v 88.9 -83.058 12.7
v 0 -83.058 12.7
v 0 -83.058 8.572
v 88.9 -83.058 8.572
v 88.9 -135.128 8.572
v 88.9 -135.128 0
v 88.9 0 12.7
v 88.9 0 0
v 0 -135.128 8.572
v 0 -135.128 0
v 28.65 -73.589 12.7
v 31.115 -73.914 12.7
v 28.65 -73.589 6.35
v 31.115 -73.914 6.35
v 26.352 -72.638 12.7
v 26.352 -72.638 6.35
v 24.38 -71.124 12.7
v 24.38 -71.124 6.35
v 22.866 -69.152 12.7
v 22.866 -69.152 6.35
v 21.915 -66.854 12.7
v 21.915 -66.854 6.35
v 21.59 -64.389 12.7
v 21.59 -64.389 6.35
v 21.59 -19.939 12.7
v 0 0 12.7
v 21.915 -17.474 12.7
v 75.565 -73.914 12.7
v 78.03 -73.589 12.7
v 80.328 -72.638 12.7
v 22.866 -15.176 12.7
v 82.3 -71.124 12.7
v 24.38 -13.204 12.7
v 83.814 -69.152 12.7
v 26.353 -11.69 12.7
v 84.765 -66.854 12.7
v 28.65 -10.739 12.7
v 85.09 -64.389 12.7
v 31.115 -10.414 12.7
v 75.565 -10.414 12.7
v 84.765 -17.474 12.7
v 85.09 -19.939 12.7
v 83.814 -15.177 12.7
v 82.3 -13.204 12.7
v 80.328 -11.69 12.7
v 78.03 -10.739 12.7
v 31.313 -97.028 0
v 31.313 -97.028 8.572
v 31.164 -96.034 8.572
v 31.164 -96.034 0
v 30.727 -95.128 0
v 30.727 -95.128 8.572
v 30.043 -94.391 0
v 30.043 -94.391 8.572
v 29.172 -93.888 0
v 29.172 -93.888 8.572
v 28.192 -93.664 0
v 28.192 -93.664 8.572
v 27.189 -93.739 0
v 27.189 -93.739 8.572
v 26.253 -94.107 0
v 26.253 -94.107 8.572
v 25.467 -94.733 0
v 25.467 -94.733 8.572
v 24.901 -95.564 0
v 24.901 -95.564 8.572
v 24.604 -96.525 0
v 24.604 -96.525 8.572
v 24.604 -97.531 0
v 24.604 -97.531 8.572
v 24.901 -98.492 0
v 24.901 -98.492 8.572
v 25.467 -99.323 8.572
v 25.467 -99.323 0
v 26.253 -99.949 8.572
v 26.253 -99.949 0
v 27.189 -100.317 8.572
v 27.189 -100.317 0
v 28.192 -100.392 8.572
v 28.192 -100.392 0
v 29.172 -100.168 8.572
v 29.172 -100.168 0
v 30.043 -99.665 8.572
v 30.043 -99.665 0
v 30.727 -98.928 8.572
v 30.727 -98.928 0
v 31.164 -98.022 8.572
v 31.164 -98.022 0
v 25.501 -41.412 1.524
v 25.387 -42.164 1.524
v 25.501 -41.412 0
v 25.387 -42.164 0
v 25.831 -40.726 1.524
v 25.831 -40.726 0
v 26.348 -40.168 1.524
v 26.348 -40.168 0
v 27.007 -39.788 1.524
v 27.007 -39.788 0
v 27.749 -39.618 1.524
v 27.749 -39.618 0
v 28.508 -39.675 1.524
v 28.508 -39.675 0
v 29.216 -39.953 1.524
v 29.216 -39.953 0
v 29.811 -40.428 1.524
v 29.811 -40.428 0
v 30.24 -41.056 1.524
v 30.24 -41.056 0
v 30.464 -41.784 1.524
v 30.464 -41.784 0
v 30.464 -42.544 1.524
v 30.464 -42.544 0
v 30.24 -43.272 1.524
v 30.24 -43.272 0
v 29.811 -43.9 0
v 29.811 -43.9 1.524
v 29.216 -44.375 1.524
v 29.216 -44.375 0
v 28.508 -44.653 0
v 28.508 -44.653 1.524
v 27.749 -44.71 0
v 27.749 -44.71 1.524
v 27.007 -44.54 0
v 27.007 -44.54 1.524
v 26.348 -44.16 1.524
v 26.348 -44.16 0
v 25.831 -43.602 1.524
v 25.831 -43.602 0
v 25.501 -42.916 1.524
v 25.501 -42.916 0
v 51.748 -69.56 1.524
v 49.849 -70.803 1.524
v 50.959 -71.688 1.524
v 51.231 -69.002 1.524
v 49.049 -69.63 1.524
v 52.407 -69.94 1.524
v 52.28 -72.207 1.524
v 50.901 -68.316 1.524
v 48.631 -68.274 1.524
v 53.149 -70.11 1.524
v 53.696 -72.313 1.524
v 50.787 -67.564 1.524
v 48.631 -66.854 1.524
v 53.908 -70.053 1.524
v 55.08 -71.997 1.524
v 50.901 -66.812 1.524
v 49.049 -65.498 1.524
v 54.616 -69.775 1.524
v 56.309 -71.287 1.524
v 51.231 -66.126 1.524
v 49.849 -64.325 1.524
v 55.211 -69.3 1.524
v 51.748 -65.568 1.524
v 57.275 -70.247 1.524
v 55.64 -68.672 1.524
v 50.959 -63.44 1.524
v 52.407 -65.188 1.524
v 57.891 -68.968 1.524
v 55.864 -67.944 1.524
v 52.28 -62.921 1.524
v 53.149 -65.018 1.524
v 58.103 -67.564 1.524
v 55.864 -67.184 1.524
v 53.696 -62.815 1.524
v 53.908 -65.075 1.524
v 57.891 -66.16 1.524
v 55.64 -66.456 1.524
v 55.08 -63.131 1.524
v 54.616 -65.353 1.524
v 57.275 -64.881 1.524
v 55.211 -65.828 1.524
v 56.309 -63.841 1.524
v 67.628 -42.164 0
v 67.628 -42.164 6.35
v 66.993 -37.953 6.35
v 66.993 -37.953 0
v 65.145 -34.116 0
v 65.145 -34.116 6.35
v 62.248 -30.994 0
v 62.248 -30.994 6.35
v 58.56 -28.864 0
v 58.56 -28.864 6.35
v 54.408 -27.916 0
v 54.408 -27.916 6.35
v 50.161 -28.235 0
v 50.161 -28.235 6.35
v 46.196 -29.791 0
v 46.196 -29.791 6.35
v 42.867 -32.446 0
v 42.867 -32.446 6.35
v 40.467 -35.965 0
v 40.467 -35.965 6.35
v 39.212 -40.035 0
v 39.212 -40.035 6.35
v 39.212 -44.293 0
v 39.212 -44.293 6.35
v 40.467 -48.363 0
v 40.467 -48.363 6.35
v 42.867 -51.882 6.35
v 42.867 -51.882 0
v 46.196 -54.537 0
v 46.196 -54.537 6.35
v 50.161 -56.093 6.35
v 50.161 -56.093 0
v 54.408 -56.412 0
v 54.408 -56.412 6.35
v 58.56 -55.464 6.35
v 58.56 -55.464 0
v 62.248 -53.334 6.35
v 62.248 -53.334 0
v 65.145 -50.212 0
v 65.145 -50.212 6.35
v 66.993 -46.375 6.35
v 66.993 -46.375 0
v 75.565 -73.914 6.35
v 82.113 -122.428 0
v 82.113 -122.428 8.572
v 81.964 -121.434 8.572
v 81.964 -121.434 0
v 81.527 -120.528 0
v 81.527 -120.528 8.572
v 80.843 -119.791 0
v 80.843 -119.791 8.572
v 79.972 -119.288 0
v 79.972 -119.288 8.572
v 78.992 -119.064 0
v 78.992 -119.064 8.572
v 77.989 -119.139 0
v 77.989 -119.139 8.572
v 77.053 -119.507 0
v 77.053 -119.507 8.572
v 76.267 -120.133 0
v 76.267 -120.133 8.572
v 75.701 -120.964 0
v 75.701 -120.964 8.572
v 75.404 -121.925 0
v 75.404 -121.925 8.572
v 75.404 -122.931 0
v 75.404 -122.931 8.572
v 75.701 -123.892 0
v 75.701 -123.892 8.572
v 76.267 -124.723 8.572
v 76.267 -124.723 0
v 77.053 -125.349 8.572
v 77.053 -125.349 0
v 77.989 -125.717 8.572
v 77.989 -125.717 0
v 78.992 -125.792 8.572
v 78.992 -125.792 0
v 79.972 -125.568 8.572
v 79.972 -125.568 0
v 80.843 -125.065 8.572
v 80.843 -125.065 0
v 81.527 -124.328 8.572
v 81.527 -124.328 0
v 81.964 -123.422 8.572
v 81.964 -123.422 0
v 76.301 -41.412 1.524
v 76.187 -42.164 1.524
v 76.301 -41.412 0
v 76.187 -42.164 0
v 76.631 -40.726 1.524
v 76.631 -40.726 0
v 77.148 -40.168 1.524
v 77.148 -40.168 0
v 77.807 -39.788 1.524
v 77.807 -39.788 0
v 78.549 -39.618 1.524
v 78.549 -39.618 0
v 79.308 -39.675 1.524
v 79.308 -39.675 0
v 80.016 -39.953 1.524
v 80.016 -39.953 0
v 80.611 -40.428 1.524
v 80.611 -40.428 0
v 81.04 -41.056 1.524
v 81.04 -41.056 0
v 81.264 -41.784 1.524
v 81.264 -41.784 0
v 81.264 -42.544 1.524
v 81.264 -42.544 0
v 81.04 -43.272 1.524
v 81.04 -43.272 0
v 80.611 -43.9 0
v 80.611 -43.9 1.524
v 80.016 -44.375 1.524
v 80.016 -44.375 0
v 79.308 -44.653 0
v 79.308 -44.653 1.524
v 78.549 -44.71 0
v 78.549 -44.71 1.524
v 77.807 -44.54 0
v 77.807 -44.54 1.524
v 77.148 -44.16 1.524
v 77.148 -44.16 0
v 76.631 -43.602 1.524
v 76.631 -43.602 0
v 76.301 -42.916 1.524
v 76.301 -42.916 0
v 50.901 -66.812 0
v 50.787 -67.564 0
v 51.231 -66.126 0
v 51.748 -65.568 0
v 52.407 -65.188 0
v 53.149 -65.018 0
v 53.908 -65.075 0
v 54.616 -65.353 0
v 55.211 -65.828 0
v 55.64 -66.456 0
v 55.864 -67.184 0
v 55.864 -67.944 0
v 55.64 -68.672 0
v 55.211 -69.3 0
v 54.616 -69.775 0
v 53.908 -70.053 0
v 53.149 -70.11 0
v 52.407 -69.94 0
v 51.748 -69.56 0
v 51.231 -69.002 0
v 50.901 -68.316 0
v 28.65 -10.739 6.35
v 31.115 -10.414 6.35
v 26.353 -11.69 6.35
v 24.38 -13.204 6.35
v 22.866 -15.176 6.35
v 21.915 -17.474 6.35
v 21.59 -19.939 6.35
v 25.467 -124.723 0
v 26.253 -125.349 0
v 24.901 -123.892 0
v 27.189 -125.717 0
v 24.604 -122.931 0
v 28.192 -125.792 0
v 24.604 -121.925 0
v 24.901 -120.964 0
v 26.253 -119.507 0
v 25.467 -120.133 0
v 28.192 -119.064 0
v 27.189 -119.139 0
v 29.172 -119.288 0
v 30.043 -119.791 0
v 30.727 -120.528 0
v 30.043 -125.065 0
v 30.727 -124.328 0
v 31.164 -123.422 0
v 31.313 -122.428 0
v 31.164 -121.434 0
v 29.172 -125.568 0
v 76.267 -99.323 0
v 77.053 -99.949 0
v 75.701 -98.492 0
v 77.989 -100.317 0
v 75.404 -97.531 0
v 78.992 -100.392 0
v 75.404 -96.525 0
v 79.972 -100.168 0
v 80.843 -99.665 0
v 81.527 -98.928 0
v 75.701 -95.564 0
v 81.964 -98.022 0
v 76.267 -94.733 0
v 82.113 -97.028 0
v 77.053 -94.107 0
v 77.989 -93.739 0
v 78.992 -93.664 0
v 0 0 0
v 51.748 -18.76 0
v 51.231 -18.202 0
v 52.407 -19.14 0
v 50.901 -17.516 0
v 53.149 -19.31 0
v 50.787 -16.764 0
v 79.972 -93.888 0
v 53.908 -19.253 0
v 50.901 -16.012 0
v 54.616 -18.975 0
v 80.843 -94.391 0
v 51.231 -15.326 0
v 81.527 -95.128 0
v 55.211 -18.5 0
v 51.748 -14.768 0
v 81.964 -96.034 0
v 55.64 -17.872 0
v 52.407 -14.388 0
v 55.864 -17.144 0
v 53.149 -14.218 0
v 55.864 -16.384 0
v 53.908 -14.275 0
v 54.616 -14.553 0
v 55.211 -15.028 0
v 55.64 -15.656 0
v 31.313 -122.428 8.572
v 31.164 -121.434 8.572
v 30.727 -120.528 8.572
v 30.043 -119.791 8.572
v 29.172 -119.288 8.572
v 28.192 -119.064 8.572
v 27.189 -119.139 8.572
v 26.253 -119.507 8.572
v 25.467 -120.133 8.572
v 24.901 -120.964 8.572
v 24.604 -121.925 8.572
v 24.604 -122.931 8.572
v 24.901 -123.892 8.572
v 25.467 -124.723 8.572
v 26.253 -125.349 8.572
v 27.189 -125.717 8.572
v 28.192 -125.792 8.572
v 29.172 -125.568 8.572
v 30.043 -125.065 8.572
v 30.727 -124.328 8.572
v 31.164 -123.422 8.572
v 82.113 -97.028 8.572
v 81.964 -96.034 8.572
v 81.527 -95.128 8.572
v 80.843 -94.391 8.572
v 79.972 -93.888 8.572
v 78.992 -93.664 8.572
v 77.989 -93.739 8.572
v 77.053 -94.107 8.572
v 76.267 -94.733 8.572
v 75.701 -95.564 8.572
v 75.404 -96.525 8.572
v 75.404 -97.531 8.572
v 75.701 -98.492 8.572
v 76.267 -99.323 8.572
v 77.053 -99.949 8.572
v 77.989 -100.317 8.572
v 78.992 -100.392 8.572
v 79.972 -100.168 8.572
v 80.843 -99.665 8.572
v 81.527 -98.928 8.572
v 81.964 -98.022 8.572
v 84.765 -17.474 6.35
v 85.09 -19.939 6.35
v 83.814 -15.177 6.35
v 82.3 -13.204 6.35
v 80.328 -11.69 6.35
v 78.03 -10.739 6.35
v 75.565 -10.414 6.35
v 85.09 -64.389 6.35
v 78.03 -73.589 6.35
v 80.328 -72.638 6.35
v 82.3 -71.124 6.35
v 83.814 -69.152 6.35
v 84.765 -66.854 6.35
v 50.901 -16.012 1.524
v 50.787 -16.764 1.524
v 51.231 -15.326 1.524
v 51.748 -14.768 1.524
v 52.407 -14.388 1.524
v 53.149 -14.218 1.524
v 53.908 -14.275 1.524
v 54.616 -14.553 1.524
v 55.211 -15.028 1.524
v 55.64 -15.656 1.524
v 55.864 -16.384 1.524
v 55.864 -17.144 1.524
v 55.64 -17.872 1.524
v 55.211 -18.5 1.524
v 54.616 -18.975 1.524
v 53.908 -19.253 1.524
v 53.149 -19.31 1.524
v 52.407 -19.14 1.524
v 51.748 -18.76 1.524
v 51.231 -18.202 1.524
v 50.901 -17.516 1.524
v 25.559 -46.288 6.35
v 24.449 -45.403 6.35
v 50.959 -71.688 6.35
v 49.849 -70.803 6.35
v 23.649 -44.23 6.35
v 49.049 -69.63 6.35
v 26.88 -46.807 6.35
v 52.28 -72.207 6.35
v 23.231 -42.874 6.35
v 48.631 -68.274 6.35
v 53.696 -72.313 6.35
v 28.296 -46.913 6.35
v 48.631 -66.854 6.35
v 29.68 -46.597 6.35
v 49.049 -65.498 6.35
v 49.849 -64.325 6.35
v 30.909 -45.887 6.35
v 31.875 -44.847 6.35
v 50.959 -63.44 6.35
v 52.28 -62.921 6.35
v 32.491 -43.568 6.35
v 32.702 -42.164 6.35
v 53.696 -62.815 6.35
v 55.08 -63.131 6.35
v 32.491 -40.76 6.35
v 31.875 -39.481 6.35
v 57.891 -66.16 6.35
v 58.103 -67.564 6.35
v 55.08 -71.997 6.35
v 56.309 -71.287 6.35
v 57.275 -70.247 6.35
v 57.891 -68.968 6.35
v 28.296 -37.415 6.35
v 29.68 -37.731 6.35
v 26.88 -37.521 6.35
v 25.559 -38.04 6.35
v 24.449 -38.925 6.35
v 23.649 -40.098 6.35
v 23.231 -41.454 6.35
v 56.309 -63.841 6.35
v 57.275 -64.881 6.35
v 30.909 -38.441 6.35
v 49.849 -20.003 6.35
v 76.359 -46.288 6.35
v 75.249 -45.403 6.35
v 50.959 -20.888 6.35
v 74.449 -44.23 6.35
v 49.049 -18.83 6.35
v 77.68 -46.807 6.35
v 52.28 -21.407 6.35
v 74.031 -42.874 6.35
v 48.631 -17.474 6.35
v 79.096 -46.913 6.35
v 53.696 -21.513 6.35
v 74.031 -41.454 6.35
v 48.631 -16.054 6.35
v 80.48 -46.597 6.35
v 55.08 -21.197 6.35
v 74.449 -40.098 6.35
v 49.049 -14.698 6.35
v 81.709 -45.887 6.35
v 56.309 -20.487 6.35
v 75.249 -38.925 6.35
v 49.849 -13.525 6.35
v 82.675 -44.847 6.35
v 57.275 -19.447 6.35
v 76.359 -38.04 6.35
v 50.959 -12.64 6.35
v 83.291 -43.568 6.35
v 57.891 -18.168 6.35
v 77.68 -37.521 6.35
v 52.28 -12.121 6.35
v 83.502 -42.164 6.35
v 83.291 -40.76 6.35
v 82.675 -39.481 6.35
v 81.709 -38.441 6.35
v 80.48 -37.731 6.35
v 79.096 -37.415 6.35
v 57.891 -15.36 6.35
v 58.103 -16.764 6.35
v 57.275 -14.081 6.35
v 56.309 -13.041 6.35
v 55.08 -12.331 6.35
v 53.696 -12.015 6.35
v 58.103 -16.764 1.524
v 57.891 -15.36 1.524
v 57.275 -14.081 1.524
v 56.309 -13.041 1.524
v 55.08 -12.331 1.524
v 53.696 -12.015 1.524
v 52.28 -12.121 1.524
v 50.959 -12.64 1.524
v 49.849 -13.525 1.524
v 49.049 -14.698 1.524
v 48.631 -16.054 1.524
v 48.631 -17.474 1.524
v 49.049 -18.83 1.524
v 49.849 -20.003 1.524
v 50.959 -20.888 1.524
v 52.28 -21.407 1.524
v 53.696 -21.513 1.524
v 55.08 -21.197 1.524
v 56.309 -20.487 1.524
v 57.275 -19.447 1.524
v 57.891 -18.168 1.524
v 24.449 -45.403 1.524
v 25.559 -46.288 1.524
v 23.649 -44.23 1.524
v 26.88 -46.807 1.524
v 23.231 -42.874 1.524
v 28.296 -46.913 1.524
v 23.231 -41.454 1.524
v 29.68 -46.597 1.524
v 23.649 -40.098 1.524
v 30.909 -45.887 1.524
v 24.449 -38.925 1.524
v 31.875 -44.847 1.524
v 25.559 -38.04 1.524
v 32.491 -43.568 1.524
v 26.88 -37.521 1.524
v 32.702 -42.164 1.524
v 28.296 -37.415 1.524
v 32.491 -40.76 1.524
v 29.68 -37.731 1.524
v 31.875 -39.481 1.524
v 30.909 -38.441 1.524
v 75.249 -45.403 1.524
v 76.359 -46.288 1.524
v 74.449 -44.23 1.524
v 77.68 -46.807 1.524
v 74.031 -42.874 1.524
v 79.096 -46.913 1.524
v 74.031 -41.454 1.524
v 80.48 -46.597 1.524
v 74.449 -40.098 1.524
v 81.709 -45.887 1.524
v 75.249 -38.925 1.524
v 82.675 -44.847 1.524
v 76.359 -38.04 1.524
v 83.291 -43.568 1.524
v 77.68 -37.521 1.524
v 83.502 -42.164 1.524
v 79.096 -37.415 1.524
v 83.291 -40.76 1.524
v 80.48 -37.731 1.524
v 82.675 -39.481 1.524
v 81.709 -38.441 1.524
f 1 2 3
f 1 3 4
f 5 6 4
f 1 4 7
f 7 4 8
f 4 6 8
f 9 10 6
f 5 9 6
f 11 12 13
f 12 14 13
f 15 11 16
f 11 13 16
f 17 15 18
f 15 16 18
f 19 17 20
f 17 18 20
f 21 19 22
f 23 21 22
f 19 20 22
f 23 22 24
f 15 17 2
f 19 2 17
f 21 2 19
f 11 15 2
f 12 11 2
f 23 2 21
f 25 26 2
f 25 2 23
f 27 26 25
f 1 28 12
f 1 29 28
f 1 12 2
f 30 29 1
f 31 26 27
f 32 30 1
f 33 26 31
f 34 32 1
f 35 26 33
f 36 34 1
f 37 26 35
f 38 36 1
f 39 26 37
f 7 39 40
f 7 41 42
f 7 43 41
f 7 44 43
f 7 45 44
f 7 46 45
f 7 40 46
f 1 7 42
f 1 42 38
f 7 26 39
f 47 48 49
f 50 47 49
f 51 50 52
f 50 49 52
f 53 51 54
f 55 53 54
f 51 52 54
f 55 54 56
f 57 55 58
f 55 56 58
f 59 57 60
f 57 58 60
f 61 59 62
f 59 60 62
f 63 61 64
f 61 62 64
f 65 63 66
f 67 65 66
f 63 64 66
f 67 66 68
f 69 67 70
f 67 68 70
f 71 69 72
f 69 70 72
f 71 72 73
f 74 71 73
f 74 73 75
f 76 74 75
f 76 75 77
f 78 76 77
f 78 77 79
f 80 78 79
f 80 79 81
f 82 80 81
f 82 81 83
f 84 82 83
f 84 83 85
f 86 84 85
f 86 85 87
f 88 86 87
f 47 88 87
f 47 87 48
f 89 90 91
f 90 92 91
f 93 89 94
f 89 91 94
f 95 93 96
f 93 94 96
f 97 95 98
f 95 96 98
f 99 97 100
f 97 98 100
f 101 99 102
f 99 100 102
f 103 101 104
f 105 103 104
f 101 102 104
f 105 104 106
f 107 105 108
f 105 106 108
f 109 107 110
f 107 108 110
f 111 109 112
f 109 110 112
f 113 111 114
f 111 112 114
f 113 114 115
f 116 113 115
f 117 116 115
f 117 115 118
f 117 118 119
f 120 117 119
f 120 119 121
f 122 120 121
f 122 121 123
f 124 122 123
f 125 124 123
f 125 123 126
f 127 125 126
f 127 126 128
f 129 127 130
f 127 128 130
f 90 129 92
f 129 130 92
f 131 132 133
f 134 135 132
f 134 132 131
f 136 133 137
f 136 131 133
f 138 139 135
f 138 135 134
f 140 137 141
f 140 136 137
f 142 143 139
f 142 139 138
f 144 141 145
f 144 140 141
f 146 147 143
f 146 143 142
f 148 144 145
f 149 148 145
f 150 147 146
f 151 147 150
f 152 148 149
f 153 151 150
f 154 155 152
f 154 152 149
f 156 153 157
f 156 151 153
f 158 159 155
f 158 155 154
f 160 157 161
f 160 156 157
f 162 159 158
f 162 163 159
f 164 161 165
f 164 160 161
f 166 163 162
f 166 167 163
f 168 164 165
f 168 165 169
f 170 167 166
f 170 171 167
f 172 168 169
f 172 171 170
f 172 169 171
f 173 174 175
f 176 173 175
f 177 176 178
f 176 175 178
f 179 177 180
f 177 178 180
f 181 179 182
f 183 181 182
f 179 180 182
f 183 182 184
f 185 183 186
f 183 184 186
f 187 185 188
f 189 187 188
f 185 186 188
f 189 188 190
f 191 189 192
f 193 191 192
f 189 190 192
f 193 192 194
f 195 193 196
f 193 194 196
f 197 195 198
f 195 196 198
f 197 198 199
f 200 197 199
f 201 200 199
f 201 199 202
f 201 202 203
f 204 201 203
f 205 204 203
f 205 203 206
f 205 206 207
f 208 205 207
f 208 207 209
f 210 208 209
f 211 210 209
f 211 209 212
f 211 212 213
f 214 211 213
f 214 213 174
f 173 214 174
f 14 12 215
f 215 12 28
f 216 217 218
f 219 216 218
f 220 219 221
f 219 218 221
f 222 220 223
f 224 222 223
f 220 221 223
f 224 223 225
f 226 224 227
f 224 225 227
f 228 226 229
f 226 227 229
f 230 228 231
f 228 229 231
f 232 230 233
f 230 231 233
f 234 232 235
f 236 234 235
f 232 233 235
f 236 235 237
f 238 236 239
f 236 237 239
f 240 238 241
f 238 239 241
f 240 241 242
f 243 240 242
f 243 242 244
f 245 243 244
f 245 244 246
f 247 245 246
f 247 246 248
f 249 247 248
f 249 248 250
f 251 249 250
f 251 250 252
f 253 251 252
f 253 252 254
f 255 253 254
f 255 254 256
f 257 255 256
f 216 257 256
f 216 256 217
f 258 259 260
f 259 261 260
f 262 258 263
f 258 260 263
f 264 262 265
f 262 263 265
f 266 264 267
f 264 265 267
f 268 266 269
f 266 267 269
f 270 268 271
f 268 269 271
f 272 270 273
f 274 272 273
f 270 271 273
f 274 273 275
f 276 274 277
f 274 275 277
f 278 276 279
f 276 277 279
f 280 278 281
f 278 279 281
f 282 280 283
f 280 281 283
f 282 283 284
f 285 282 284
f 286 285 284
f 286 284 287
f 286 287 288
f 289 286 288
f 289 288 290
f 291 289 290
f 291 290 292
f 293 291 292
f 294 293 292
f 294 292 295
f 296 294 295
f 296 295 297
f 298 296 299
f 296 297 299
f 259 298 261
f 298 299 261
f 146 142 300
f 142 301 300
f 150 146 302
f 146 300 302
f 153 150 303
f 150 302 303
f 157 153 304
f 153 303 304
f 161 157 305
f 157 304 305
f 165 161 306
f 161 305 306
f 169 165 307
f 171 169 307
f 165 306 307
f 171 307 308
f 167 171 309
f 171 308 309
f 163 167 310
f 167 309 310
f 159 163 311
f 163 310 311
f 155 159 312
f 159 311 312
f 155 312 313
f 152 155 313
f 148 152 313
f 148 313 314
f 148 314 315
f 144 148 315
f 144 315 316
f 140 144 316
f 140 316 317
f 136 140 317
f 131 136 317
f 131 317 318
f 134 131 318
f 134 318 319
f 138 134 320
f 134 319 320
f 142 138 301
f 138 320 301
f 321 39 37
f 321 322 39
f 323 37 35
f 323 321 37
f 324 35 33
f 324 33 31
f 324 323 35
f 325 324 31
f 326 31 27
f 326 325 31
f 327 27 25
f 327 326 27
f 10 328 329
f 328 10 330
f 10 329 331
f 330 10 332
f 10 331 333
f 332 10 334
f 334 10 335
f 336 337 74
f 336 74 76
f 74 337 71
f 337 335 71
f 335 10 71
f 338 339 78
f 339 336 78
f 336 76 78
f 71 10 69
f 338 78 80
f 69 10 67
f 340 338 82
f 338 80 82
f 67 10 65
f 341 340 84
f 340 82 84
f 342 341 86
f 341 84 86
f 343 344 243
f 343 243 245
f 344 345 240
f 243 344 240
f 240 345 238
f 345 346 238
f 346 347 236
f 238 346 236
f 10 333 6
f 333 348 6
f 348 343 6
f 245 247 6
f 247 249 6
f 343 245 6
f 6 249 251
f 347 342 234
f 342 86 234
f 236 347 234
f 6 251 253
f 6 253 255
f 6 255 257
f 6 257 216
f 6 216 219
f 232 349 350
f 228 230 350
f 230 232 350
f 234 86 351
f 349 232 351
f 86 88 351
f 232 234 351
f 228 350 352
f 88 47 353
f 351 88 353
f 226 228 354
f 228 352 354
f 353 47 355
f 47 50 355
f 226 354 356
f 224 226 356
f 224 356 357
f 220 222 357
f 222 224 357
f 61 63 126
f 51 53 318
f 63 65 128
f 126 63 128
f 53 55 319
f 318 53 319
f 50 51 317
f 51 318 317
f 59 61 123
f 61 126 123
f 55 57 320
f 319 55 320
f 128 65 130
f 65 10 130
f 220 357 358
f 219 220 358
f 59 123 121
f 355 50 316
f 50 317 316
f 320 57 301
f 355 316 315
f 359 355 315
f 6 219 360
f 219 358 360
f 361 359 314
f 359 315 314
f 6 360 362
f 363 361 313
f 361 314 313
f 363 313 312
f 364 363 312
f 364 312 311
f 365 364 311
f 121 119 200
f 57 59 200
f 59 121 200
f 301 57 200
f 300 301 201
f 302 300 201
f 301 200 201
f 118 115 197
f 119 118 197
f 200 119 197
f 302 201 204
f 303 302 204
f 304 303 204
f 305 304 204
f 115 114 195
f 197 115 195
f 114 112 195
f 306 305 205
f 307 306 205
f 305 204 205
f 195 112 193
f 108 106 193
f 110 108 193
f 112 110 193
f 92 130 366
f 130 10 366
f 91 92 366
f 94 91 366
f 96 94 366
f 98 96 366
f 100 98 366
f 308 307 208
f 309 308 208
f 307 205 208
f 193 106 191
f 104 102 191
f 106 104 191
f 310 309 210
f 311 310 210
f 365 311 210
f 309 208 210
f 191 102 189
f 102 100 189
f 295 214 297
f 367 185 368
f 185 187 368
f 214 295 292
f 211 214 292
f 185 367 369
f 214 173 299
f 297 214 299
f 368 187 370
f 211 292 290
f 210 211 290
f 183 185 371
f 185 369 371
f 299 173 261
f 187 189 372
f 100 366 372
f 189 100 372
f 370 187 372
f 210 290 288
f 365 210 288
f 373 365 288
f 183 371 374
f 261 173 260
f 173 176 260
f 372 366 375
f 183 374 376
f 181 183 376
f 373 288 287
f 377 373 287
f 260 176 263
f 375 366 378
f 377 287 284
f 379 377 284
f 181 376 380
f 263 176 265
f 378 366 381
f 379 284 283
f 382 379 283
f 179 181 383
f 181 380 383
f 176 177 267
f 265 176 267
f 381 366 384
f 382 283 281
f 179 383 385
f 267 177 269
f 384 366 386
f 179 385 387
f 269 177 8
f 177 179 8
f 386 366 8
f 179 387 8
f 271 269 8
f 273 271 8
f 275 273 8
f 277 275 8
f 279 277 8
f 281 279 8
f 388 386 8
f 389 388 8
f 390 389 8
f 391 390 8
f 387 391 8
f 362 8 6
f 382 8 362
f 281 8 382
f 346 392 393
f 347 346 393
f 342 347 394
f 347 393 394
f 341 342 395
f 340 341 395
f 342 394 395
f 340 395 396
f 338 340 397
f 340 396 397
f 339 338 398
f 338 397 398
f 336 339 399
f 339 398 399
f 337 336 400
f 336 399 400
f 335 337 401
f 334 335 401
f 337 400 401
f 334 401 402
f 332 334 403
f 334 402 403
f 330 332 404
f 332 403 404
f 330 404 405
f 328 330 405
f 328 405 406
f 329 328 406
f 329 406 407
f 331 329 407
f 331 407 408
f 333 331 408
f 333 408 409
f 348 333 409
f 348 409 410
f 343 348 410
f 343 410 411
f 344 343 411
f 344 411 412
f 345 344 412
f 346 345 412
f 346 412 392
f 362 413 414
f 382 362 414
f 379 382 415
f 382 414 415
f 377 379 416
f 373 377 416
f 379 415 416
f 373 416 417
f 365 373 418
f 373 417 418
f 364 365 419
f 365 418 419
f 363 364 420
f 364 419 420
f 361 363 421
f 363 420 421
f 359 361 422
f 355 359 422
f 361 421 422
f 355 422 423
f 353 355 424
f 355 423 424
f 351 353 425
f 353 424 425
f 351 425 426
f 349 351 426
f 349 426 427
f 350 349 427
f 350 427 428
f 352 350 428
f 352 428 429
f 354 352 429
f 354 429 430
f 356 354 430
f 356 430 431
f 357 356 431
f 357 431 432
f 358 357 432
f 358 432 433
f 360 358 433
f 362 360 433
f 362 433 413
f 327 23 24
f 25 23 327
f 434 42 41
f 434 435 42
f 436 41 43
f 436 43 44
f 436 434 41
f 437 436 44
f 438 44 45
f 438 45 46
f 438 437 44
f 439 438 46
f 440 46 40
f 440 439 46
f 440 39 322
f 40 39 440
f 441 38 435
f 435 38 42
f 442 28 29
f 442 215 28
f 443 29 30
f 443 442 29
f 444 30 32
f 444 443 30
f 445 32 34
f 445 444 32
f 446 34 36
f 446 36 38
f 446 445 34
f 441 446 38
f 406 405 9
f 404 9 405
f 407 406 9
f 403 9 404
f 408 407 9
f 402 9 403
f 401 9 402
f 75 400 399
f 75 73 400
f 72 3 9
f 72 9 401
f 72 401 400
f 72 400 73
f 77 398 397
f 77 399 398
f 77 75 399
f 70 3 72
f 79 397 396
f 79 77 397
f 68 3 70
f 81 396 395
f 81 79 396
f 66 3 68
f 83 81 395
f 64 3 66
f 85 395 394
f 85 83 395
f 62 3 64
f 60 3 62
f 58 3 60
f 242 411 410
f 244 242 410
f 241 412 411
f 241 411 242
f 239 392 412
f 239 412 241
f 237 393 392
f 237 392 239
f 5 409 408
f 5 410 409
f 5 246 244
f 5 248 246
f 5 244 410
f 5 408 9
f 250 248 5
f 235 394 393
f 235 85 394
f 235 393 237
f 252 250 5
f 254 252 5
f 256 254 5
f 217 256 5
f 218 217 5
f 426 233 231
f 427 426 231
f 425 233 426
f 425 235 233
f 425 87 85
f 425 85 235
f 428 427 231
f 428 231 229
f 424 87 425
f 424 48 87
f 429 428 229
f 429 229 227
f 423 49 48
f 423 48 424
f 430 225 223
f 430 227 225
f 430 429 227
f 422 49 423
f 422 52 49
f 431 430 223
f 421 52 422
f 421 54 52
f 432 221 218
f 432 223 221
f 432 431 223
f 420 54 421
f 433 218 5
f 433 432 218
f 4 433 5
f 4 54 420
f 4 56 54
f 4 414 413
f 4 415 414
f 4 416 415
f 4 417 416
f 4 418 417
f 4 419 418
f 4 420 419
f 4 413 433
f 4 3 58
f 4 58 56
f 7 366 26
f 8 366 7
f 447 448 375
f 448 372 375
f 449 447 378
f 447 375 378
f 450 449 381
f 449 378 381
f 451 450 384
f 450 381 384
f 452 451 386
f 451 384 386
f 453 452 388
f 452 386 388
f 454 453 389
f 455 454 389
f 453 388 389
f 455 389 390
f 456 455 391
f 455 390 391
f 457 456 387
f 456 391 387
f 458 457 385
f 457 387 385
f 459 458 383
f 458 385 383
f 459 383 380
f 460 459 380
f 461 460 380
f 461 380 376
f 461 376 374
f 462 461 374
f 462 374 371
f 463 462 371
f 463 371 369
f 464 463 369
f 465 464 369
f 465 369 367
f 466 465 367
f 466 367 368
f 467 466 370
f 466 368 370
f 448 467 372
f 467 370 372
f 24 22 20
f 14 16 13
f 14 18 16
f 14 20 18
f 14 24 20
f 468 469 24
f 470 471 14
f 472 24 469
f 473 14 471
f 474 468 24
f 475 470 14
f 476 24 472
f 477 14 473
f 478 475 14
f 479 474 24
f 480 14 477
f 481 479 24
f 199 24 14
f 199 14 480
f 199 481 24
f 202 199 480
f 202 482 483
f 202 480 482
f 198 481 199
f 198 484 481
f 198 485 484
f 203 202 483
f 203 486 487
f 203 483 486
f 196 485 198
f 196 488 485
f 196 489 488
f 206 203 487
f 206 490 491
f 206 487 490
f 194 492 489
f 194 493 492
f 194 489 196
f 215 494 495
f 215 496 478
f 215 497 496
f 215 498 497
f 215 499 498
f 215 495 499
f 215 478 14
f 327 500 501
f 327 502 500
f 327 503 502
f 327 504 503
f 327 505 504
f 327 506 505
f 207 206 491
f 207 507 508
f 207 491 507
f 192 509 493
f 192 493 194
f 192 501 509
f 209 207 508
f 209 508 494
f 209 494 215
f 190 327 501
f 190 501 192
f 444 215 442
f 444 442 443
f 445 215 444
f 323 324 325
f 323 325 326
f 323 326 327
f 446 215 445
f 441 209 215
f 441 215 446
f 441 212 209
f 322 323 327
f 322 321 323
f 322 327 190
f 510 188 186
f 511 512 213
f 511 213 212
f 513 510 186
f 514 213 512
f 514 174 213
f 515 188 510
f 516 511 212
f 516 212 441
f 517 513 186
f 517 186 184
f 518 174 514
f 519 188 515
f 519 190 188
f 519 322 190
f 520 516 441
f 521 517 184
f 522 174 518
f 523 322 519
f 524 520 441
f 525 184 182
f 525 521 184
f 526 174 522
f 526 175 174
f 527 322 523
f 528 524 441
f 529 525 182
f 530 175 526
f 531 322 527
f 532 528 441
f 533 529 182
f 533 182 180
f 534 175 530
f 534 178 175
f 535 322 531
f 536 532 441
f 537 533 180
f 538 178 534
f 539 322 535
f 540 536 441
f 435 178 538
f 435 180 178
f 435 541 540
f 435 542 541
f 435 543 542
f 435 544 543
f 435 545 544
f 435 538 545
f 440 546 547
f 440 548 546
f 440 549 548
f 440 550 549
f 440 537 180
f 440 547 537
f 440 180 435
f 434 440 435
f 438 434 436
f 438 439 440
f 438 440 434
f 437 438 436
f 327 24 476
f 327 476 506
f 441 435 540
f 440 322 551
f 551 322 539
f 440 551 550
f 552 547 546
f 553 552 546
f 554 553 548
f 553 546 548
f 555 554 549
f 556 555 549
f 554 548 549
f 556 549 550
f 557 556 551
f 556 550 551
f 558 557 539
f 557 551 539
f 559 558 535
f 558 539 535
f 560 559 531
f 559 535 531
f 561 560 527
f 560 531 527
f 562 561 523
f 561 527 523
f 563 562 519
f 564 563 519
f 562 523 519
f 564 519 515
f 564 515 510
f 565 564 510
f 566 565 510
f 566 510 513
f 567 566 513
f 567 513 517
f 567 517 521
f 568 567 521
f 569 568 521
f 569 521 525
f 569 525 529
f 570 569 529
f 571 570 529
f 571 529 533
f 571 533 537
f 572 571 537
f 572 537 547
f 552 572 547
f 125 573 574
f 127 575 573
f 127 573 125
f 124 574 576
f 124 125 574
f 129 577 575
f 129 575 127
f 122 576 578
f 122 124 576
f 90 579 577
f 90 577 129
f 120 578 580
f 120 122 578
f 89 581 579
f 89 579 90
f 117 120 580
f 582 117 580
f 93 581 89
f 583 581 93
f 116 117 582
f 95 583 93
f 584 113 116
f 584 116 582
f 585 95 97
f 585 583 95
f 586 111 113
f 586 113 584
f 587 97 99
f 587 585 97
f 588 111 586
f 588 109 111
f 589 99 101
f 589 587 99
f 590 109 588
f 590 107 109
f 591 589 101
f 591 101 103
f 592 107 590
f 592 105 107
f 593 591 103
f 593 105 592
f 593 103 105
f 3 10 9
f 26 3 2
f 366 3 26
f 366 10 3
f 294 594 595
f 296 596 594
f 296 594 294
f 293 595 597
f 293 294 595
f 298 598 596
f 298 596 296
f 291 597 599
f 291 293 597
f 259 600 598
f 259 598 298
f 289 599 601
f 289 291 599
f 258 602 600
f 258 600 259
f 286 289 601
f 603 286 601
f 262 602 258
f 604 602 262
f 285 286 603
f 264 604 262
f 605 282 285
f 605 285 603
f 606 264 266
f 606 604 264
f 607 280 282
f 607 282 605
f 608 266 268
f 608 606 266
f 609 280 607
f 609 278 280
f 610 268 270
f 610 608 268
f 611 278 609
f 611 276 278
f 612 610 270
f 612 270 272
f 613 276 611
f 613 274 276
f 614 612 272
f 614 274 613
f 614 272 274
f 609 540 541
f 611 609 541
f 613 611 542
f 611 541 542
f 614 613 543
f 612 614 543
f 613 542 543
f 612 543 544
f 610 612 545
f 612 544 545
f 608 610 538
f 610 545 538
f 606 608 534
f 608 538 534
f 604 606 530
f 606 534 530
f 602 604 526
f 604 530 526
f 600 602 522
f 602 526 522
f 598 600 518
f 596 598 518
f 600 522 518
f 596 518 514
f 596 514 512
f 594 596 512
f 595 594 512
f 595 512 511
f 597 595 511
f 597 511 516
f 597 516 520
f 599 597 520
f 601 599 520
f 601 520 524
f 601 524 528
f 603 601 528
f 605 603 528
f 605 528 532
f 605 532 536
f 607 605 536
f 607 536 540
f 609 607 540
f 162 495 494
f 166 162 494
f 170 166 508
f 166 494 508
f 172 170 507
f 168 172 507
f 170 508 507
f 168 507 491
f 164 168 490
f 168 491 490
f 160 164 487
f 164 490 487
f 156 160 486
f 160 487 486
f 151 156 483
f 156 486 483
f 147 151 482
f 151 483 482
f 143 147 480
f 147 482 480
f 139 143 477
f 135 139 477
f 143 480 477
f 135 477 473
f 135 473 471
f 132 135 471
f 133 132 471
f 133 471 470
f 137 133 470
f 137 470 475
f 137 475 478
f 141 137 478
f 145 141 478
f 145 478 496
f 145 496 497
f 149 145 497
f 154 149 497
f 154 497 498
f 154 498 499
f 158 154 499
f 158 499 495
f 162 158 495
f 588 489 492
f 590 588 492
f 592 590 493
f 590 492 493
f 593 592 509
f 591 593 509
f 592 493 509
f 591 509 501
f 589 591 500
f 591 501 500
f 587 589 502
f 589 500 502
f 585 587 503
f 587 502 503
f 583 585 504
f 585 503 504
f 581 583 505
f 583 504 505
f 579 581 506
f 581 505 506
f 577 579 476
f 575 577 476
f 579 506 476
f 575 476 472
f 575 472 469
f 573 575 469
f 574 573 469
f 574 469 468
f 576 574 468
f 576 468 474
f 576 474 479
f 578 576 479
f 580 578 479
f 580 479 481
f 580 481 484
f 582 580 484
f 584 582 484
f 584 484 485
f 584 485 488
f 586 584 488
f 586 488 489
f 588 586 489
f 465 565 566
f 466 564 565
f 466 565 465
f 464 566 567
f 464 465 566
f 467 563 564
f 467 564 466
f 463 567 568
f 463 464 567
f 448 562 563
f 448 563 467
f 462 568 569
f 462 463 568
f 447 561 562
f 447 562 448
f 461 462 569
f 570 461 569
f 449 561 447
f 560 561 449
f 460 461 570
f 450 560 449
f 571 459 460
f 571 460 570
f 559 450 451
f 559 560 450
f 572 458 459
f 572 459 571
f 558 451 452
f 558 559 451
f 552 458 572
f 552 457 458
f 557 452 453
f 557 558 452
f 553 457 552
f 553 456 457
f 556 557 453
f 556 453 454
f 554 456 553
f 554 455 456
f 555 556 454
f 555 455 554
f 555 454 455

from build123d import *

# Parameters (mm, degrees)
SKETCH1_W                                       = 88.9
SKETCH1_H                                       = 135.128
BOSS_EXTRUDE1_DEPTH                             = 12.7
SKETCH2_R                                       = 14.2875
CUT_EXTRUDE1_DEPTH                              = 163.246961093
CBORE_FOR_10_SOCKET_HEAD_CAP_SCREW1_D           = 5.1054
CBORE_FOR_10_SOCKET_HEAD_CAP_SCREW1_CBORE_D     = 9.525
CBORE_FOR_10_SOCKET_HEAD_CAP_SCREW1_CBORE_DEPTH = 4.826
SKETCH5_R                                       = 3.3734375
CUT_EXTRUDE2_DEPTH                              = 163.246961093
SKETCH6_W                                       = 63.5
SKETCH6_H                                       = 63.5
CUT_EXTRUDE3_DEPTH                              = 6.35
FILLET1_R                                       = 9.525
SKETCH7_W                                       = 88.9
SKETCH7_H                                       = 52.07
CUT_EXTRUDE4_DEPTH                              = 4.1275
CBORE_FOR_10_SOCKET_HEAD_CAP_SCREW2_D           = 5.1054
CBORE_FOR_10_SOCKET_HEAD_CAP_SCREW2_DEPTH       = 22.86
CBORE_FOR_10_SOCKET_HEAD_CAP_SCREW2_CBORE_D     = 9.525
CBORE_FOR_10_SOCKET_HEAD_CAP_SCREW2_CBORE_DEPTH = 4.826
CBORE_FOR_10_SOCKET_HEAD_CAP_SCREW2_TIP         = 1.533816902


with BuildPart() as part:
    # Sketch1 → Boss-Extrude1 (new body)
    with BuildSketch(Plane.XY):
        with Locations((44.45, -67.564)):
            Rectangle(SKETCH1_W, SKETCH1_H)
    extrude(amount=BOSS_EXTRUDE1_DEPTH)

    # Sketch2 → Cut-Extrude1 (cut, through all)
    with BuildSketch(Plane.XY.offset(12.7)):
        with Locations((53.34, -42.164)):
            Circle(SKETCH2_R)
    extrude(amount=-CUT_EXTRUDE1_DEPTH, mode=Mode.SUBTRACT)

    # CBORE for #10 Socket Head Cap Screw1 (through all)
    with Locations(Plane.XY.offset(12.7)):
        with Locations((53.34, -16.764), (53.34, -67.564), (27.94, -42.164), (78.74, -42.164)):
            CounterBoreHole(CBORE_FOR_10_SOCKET_HEAD_CAP_SCREW1_D / 2, CBORE_FOR_10_SOCKET_HEAD_CAP_SCREW1_CBORE_D / 2, CBORE_FOR_10_SOCKET_HEAD_CAP_SCREW1_CBORE_DEPTH)

    # Sketch5 → Cut-Extrude2 (cut, through all)
    with BuildSketch(Plane.XY.offset(12.7)):
        with Locations((27.94, -122.428)):
            Circle(SKETCH5_R)
        with Locations((78.74, -122.428)):
            Circle(SKETCH5_R)
        with Locations((27.94, -97.028)):
            Circle(SKETCH5_R)
        with Locations((78.74, -97.028)):
            Circle(SKETCH5_R)
    extrude(amount=-CUT_EXTRUDE2_DEPTH, mode=Mode.SUBTRACT)

    # Sketch6 → Cut-Extrude3 (cut)
    with BuildSketch(Plane.XY.offset(12.7)):
        with Locations((53.34, -42.164)):
            Rectangle(SKETCH6_W, SKETCH6_H)
    extrude(amount=-CUT_EXTRUDE3_DEPTH, mode=Mode.SUBTRACT)

    # Fillet1
    fillet1_edges = [part.edges().sort_by_distance(p)[0] for p in [
        (85.09, -10.414, 9.525),
        (85.09, -73.914, 9.525),
        (21.59, -73.914, 9.525),
        (21.59, -10.414, 9.525),
    ]]
    fillet(fillet1_edges, radius=FILLET1_R)

    # Sketch7 → Cut-Extrude4 (cut)
    with BuildSketch(Plane.XY.offset(12.7)):
        with Locations((44.45, -109.093)):
            Rectangle(SKETCH7_W, SKETCH7_H)
    extrude(amount=-CUT_EXTRUDE4_DEPTH, mode=Mode.SUBTRACT)

    # CBORE for #10 Socket Head Cap Screw2
    with Locations(Plane.XY.offset(6.35)):
        with Locations((53.34, -16.764), (78.74, -42.164), (53.34, -67.564), (27.94, -42.164)):
            CounterBoreHole(CBORE_FOR_10_SOCKET_HEAD_CAP_SCREW2_D / 2, CBORE_FOR_10_SOCKET_HEAD_CAP_SCREW2_CBORE_D / 2, CBORE_FOR_10_SOCKET_HEAD_CAP_SCREW2_CBORE_DEPTH, depth=CBORE_FOR_10_SOCKET_HEAD_CAP_SCREW2_DEPTH)
            with Locations((0, 0, -(CBORE_FOR_10_SOCKET_HEAD_CAP_SCREW2_DEPTH + CBORE_FOR_10_SOCKET_HEAD_CAP_SCREW2_TIP / 2))):  # 118° drill point
                Cone(0, CBORE_FOR_10_SOCKET_HEAD_CAP_SCREW2_D / 2, CBORE_FOR_10_SOCKET_HEAD_CAP_SCREW2_TIP, mode=Mode.SUBTRACT)


solid = part.part
